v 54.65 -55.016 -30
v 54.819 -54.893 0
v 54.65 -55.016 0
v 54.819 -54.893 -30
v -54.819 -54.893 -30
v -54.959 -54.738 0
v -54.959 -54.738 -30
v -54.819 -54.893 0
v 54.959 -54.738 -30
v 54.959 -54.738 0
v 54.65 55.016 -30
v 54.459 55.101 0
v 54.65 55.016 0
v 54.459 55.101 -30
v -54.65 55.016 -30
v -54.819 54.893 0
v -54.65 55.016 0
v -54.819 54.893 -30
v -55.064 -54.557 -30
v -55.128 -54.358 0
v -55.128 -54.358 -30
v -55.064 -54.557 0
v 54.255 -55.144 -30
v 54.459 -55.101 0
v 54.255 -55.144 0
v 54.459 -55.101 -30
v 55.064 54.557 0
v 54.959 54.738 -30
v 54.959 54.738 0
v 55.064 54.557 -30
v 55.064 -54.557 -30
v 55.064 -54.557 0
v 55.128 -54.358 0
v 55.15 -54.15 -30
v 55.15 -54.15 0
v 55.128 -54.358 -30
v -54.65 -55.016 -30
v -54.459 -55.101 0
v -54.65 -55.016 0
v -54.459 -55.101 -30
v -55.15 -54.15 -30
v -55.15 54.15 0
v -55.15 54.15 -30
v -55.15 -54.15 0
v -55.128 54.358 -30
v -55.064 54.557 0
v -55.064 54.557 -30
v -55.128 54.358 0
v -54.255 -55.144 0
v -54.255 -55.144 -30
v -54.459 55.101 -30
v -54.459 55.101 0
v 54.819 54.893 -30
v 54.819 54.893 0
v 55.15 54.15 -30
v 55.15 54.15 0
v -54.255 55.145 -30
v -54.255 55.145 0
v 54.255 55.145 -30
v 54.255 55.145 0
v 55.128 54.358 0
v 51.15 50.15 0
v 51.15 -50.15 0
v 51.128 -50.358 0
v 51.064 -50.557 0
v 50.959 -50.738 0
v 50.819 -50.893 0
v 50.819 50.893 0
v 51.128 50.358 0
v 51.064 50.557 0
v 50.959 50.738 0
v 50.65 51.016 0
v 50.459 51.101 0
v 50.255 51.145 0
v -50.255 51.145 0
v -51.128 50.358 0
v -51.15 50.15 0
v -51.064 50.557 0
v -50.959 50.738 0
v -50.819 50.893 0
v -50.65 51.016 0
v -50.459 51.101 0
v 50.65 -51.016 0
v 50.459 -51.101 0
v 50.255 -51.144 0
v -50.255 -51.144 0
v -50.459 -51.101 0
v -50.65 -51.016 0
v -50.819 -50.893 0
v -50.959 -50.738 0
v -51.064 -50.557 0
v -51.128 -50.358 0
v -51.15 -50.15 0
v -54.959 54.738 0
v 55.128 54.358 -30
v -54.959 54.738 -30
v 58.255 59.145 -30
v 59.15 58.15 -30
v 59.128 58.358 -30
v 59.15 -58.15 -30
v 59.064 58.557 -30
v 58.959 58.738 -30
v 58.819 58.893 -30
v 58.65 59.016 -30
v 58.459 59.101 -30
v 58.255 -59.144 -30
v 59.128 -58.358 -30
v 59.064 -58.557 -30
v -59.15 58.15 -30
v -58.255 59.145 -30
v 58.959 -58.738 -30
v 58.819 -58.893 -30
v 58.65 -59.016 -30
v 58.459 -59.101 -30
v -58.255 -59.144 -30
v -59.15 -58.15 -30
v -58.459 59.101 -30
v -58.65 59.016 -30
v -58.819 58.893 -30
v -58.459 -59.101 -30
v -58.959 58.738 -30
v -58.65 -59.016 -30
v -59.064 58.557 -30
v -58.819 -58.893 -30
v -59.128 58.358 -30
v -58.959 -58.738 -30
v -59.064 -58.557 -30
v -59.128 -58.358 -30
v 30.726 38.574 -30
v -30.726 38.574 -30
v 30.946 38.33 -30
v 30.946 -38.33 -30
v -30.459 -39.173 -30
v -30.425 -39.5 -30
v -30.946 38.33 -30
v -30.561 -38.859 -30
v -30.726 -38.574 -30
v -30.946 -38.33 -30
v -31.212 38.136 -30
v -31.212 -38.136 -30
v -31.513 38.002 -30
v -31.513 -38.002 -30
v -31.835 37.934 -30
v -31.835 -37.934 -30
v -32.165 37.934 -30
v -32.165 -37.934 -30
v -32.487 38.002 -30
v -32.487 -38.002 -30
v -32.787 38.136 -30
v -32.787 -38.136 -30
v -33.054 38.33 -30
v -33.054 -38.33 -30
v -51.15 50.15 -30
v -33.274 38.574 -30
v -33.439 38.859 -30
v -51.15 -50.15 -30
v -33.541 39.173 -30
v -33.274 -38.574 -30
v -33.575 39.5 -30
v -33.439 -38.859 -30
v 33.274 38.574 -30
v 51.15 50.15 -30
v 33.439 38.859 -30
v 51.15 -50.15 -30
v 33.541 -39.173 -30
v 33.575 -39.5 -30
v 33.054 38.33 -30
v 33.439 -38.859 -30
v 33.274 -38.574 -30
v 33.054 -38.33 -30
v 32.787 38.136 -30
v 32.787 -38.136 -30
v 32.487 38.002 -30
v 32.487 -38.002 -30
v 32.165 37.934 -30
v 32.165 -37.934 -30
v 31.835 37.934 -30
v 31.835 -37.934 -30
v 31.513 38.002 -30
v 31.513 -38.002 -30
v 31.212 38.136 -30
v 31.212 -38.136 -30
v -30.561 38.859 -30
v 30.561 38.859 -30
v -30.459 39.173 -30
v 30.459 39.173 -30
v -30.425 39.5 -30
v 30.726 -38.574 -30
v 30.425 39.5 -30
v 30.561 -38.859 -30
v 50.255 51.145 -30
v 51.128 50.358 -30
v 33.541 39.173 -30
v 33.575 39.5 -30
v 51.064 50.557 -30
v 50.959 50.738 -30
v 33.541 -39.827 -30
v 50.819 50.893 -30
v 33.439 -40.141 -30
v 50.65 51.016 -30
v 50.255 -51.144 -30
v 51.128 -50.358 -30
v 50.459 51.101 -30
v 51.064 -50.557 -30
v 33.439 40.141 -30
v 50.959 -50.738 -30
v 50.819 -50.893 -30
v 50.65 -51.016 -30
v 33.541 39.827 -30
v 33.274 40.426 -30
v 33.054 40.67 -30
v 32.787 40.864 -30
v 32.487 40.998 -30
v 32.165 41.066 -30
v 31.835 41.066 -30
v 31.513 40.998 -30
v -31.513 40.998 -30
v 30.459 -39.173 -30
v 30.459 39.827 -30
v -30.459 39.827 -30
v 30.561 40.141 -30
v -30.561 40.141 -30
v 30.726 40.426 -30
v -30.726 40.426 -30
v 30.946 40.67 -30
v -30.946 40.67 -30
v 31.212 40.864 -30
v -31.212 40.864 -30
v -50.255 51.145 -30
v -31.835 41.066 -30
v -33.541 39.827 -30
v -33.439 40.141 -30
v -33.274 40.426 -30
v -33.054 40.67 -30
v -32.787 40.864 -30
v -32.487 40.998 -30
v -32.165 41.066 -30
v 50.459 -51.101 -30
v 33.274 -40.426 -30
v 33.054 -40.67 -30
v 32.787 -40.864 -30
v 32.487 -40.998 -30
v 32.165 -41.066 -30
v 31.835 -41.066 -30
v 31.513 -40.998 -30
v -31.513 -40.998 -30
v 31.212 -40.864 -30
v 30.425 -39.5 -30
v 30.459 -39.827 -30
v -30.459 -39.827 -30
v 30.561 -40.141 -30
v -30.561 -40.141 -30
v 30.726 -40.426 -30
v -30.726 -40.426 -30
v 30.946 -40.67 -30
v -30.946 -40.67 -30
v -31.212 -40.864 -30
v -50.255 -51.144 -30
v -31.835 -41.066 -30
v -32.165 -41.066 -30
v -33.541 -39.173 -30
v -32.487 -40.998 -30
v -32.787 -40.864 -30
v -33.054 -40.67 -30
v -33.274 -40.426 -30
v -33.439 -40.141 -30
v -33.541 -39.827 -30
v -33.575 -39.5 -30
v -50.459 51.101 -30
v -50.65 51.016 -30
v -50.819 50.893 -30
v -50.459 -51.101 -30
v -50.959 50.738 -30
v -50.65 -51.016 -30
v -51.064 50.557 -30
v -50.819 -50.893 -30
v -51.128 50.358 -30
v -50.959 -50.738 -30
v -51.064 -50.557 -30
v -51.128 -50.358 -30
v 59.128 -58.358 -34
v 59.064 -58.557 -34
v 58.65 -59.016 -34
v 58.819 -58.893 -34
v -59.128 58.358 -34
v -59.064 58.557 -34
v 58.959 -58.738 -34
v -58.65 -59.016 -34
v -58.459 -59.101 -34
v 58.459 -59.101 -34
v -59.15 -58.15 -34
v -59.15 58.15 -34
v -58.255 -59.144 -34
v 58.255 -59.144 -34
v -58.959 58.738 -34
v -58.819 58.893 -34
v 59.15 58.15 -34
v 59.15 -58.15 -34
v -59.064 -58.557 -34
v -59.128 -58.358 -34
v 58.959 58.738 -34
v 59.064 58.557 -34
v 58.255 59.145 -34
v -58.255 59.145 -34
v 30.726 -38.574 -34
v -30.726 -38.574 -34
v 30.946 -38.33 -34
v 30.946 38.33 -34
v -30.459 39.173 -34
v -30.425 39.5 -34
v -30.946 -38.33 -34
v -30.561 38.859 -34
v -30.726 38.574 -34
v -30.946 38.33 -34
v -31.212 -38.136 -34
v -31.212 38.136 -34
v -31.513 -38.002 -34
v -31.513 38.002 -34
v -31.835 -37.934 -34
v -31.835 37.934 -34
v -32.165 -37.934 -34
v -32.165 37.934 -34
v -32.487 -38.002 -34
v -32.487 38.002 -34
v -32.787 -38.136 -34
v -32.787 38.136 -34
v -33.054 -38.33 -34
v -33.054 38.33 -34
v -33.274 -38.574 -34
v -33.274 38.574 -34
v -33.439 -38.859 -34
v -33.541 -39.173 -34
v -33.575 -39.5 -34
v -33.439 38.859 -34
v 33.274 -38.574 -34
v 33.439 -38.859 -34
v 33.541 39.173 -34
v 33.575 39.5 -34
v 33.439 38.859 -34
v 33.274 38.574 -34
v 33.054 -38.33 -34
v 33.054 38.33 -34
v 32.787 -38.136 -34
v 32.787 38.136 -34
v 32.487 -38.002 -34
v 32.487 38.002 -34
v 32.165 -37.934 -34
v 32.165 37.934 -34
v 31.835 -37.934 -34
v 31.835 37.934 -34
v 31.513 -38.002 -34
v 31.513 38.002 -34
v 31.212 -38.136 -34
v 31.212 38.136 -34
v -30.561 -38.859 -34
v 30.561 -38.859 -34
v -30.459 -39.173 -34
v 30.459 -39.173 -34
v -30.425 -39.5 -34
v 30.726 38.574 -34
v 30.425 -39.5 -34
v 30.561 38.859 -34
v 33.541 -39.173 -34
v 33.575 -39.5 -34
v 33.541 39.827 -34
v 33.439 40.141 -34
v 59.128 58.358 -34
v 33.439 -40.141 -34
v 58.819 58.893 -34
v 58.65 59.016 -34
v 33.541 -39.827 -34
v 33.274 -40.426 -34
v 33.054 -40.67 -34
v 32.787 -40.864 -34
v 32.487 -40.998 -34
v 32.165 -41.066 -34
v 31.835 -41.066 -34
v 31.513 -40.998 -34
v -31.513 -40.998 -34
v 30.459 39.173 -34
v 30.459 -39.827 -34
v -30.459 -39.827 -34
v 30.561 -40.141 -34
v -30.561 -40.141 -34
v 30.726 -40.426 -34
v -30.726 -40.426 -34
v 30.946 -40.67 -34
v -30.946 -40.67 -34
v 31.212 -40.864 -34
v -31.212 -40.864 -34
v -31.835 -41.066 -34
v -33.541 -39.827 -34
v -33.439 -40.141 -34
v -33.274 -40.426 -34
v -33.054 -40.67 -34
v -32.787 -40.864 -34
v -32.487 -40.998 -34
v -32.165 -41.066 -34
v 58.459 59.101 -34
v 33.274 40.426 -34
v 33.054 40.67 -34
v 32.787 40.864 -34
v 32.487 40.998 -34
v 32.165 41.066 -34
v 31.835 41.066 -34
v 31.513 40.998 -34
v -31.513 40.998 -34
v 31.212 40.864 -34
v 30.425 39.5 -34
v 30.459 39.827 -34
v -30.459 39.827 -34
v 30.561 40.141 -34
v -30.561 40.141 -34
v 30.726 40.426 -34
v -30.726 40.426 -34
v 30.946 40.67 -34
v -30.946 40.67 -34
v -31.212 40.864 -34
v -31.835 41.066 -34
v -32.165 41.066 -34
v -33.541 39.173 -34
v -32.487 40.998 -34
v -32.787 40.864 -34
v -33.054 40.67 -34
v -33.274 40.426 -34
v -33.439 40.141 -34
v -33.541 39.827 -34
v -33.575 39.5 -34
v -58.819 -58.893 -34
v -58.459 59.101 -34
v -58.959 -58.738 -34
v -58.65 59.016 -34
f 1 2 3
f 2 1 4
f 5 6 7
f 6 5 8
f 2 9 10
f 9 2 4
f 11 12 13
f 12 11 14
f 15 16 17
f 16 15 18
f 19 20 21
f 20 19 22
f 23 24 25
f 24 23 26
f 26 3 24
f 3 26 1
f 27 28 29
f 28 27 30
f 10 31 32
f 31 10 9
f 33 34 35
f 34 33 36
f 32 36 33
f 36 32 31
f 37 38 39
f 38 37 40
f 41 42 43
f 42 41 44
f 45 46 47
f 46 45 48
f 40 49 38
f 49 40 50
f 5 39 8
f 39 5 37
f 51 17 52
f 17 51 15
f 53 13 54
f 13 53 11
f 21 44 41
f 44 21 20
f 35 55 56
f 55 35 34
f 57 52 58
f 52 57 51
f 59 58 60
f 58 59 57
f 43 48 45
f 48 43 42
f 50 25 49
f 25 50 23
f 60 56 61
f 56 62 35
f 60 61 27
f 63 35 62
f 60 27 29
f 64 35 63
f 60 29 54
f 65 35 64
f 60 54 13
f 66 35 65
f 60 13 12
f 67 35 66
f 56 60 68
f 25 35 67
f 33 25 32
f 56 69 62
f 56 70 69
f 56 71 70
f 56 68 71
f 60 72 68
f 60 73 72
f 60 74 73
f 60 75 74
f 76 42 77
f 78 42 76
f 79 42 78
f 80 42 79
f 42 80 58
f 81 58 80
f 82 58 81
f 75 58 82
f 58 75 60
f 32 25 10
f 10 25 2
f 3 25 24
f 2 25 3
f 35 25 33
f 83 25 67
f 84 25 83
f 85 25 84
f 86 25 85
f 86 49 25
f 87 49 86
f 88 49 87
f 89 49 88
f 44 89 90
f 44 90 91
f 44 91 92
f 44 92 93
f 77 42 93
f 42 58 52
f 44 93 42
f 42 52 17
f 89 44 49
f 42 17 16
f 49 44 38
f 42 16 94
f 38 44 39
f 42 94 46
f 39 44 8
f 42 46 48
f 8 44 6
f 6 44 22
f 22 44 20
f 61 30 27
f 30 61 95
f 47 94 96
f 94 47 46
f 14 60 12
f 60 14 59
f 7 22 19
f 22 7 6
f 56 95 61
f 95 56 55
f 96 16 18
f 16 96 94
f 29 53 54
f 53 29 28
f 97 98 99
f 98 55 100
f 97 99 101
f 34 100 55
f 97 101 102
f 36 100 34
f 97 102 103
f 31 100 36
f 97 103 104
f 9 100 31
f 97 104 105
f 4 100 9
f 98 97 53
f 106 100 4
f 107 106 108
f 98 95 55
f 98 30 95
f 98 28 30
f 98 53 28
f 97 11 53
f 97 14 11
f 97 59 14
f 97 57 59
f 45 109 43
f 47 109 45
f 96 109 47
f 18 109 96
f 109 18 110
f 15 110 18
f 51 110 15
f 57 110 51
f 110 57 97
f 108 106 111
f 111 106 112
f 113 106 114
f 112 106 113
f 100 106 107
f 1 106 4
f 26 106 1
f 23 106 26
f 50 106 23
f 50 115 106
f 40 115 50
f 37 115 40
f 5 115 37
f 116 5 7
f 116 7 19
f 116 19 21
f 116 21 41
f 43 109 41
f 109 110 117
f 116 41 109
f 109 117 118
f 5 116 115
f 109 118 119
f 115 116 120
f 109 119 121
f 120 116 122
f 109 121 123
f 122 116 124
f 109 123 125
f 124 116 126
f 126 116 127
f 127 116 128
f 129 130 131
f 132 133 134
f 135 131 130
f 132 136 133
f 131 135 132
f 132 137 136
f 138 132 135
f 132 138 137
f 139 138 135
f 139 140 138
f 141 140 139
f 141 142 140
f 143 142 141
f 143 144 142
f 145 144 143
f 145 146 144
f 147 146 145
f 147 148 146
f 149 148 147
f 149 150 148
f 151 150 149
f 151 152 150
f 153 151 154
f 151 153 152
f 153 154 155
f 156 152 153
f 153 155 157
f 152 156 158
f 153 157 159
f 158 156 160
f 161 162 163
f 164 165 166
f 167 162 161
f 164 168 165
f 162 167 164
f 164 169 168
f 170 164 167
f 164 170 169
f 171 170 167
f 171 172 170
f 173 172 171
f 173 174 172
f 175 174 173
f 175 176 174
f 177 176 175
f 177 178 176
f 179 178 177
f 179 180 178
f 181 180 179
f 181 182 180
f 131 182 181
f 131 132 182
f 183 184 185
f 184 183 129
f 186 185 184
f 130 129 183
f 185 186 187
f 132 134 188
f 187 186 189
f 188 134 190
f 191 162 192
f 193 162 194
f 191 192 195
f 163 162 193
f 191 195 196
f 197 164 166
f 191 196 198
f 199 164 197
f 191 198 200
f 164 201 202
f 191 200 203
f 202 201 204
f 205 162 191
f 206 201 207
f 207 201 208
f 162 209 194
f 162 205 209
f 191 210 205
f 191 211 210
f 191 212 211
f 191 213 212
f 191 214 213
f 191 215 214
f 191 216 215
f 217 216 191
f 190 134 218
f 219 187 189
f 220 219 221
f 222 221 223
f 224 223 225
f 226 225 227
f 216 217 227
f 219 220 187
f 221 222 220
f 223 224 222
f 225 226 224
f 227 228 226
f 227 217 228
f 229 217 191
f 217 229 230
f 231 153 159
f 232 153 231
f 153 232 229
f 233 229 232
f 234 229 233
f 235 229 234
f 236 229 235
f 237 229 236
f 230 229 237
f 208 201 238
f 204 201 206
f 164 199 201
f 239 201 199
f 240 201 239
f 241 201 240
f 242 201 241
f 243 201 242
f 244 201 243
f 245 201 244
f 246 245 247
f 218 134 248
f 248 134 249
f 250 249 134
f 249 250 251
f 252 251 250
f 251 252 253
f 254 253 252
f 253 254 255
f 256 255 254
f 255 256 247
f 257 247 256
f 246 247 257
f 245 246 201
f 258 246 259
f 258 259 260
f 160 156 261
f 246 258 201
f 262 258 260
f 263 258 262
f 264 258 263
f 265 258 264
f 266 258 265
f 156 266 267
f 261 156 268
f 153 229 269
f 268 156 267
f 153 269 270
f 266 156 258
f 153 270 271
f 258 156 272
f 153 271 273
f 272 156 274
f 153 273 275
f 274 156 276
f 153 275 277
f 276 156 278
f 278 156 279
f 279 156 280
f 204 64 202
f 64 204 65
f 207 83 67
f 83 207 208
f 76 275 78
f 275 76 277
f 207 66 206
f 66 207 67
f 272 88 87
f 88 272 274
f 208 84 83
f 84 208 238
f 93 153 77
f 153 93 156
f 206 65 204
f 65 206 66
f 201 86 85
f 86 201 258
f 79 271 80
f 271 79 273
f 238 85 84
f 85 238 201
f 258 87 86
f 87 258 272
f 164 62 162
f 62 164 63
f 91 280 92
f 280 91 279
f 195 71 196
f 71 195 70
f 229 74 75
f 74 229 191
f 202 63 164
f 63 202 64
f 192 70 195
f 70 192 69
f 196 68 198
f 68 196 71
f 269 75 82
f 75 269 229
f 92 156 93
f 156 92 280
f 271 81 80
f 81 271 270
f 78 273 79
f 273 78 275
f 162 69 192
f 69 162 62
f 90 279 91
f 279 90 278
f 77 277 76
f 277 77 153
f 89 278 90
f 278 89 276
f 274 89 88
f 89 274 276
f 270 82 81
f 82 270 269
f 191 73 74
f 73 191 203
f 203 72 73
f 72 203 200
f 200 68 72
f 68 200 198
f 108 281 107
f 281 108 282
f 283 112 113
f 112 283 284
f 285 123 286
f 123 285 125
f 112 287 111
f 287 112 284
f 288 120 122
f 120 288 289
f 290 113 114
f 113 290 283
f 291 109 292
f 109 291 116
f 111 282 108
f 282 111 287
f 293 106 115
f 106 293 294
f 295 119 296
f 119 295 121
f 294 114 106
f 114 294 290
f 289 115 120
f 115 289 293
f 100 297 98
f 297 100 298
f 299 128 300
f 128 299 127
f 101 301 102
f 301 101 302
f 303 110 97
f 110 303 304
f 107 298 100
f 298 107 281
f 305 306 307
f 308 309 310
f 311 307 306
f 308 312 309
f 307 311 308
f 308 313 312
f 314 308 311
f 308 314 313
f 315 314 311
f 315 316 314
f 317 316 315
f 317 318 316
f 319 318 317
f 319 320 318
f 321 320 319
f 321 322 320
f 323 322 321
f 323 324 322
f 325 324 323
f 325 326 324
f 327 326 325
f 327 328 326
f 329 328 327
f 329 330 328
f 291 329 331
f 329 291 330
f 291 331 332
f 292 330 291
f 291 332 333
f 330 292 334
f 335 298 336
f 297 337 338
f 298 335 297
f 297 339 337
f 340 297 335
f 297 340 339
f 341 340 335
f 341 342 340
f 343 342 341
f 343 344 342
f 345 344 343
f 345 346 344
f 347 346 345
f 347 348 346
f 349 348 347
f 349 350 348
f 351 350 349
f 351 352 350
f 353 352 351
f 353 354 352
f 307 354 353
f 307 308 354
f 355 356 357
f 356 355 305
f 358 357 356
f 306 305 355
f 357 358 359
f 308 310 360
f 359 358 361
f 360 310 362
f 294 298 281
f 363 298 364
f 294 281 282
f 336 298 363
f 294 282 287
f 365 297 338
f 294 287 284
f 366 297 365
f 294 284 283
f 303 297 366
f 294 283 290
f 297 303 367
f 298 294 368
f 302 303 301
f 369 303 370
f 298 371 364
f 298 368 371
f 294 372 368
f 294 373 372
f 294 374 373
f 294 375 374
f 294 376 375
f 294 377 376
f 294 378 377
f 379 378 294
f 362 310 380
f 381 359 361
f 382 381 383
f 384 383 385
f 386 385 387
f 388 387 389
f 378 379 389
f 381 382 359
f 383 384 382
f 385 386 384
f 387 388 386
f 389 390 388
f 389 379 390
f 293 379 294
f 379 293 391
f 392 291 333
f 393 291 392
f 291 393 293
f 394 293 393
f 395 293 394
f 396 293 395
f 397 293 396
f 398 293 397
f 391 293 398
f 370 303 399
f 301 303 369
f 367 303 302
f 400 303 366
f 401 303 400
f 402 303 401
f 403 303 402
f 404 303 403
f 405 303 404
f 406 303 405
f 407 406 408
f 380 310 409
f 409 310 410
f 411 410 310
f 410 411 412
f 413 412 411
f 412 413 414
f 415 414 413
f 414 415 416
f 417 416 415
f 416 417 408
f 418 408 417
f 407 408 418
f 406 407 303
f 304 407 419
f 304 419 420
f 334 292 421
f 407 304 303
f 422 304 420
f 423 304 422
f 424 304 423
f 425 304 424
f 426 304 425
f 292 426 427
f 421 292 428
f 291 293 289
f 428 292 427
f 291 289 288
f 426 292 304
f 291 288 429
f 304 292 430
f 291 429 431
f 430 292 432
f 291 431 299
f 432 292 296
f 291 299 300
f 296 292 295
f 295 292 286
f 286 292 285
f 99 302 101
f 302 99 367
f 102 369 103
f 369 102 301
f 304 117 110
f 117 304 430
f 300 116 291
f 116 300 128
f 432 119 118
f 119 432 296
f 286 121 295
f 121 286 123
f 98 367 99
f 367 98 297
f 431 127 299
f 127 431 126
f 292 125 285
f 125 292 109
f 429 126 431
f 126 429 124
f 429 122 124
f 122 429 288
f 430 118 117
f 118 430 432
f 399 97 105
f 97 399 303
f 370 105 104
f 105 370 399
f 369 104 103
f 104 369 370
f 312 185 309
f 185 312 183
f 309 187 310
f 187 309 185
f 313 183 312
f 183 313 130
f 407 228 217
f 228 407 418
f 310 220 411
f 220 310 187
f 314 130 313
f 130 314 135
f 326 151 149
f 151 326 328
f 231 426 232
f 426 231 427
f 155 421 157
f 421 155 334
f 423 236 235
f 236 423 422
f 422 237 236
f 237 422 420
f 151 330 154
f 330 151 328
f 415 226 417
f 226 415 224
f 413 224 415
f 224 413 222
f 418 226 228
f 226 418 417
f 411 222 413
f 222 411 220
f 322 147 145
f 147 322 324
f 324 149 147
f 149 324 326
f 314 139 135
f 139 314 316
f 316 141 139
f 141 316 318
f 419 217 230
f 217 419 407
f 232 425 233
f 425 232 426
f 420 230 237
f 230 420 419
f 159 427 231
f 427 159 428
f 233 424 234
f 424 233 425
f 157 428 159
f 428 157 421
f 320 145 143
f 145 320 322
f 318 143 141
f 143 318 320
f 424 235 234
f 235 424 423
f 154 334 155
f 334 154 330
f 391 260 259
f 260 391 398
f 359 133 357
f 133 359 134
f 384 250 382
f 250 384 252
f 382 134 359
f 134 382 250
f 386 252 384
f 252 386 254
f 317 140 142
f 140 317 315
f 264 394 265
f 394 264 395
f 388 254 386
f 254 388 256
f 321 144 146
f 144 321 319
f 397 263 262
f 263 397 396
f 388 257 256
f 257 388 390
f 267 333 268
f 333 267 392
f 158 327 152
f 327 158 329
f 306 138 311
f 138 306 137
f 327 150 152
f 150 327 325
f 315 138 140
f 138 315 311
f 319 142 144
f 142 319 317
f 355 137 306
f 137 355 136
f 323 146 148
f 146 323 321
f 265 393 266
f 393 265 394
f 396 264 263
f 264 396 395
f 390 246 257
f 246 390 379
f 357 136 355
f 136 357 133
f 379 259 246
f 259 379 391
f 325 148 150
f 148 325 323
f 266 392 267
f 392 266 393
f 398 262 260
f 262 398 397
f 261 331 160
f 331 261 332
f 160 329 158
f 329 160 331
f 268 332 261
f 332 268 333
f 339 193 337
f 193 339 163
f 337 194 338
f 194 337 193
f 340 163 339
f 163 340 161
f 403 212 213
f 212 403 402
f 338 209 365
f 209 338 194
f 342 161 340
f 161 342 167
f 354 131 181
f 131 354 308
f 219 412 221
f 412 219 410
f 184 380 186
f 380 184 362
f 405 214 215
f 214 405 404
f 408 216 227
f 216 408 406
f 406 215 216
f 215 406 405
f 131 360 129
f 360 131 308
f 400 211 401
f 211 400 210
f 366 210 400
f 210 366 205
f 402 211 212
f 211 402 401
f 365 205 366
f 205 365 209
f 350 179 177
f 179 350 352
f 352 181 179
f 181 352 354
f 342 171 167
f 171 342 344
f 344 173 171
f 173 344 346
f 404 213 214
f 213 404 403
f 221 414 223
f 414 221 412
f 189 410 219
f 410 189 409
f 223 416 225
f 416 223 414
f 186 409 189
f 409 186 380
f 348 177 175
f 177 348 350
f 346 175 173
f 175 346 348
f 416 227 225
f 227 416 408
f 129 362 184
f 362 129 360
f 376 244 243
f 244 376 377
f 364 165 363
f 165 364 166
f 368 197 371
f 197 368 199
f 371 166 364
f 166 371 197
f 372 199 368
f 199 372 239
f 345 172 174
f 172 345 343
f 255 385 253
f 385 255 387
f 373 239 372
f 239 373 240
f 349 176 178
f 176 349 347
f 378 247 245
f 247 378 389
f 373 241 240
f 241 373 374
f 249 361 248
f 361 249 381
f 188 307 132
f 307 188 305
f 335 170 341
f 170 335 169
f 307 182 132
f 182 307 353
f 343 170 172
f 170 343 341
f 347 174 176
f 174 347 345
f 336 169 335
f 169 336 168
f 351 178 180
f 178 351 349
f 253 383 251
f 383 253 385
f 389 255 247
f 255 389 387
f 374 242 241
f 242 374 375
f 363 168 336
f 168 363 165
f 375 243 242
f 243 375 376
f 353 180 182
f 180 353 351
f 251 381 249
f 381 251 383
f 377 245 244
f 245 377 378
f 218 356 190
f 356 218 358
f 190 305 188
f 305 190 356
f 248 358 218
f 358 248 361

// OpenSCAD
/*
Deck Post Cap
For mounting Long Range Weather Station

Created October 16, 2023
Modified November 23, 2023

Notes 12/13/23:
    - rot_cap_theta set to my deck "South"
    - easier to calibrate wind direction
*/

bott_cap_lw = 102.3; // length/width of deck post, bottom l/w of cap
bott_cap_h = 30; // inside cap height

top_t = 4; // cap top thickness
wall_t = 4; // wall thickness
cap_lw = bott_cap_lw + wall_t * 4; // top cap length/width

hole_d = 3.15; // mount hole diameter
x_dist = 64; // x hole spacing
y_dist = 79; // y hole spacing

rot_cap_lw = 83; // rotating part to set correct north/south angle
rot_cap_theta = -39; // rot cap rotation -- was 30
x_off = (rot_cap_lw - x_dist)/2;
y_off = (rot_cap_lw - y_dist)/2;
rradius = 1; // common rectangle rounded radius

bracket_t = 6; // bracket thickness
arm_cyl_d = 15; // bracket arm cylinder diameter
center_cyl_d = 35; // bracket center cylinder diameter

$fs = 0.2; // precision of curves

module rounded_rect(size=[1, 1], radius=0.5, center=false) {
	// If single value, convert to [x, y] vector
	size = (size[0] == undef) ? [size, size] : size;

	translate = (center == false) ?
		[radius, radius] :
		[radius - size[0]/2, radius - size[1]/2];

	translate(v = translate)
	minkowski() {
		square(size = [
            size[0] - radius * 2,
			size[1] - radius * 2,
		]);
		circle(r = radius);
	}
}

module extruded_rounded_rect(size=[1, 1, 1], radius=0.5, center=false) {
    translate([0, 0, -size.z/2])
    linear_extrude(size.z)
        rounded_rect(size=[size.x, size.y], radius=radius, center=center);
}

module cap_bottom() {
    translate([0, 0, bott_cap_h/2])
        difference() {
            extruded_rounded_rect(size=[bott_cap_lw + wall_t * 2, bott_cap_lw + wall_t * 2, bott_cap_h], radius=rradius, center=true);
            extruded_rounded_rect(size=[bott_cap_lw, bott_cap_lw, bott_cap_h], radius=rradius, center=true);
        }
}

module cap_top() {
    translate([0, 0, top_t/2 + bott_cap_h])
        extruded_rounded_rect(size=[cap_lw, cap_lw, top_t], radius=rradius, center=true);
}

module rot_cap_cube() {
    translate([0, 0, top_t/2])
        cube(size=[rot_cap_lw, rot_cap_lw, top_t], center=true);
}

module draw_rot_cap(rot) {
    translate([0, 0, bott_cap_h])
    rotate(rot) {
        difference() {
            rot_cap_cube();
            
            // mount holes
            color("red")
            for(x=[-1 , 1], y=[-1 , 1]) {
                translate([x * x_dist/2, y * y_dist/2, 0])
                    cylinder(d=hole_d, h=top_t);
            }
        }
    }
}

module draw_cap(rot_mount) {
    rot = rot_mount ? rot_cap_theta : 0;

    rotate([180, 0, 0]) { // flip over x axis for better print orientation
        cap_bottom();
        
        difference() {
            cap_top();

            // cut out rotating part -- MAY BE OBSOLETE b/c of bracket
            // rotated mount holes may not fit inside of the cap!
            translate([0, 0,  bott_cap_h])
            rotate(rot)
               rot_cap_cube();
        }
        
        color("orange")
        draw_rot_cap(rot);
    }
}

module bracket_arms(hole_rot) {
    difference() {
        union() {
            // arm 1
            hull() {
                translate([x_dist/2, y_dist/2, 0])
                    cylinder(d=arm_cyl_d, h=bracket_t);
                translate([-x_dist/2, -y_dist/2, 0])
                    cylinder(d=arm_cyl_d, h=bracket_t);
            }
            // arm 2
            hull() {
                translate([-x_dist/2, y_dist/2, 0])
                    cylinder(d=arm_cyl_d, h=bracket_t);
                translate([x_dist/2, -y_dist/2, 0])
                    cylinder(d=arm_cyl_d, h=bracket_t);
            }
            // hub
            cylinder(d=center_cyl_d, h=bracket_t);
        }

        // connecting holes in center
        color("green")
        rotate(hole_rot)
        for(x=[-1, 1], y=[-1, 1]) {
            translate([x * 0.4 * arm_cyl_d, y * 0.4 * arm_cyl_d])
                cylinder(d=hole_d, h=bracket_t);
        }

        // mounting holes
        for(x=[-1, 1], y=[-1, 1]) {
            translate([x * x_dist/2, y * y_dist/2, 0])
                cylinder(d=hole_d, h=bracket_t);
        }
    }
}

module draw_brackets() {
    // bracket_arms(hole_rot=0);
    translate([x_dist * 1.5, 0, 0])
    // rotate(rot_cap_theta)
        bracket_arms(hole_rot=-rot_cap_theta);
}

draw_cap(rot_mount=false);
// draw_brackets();
